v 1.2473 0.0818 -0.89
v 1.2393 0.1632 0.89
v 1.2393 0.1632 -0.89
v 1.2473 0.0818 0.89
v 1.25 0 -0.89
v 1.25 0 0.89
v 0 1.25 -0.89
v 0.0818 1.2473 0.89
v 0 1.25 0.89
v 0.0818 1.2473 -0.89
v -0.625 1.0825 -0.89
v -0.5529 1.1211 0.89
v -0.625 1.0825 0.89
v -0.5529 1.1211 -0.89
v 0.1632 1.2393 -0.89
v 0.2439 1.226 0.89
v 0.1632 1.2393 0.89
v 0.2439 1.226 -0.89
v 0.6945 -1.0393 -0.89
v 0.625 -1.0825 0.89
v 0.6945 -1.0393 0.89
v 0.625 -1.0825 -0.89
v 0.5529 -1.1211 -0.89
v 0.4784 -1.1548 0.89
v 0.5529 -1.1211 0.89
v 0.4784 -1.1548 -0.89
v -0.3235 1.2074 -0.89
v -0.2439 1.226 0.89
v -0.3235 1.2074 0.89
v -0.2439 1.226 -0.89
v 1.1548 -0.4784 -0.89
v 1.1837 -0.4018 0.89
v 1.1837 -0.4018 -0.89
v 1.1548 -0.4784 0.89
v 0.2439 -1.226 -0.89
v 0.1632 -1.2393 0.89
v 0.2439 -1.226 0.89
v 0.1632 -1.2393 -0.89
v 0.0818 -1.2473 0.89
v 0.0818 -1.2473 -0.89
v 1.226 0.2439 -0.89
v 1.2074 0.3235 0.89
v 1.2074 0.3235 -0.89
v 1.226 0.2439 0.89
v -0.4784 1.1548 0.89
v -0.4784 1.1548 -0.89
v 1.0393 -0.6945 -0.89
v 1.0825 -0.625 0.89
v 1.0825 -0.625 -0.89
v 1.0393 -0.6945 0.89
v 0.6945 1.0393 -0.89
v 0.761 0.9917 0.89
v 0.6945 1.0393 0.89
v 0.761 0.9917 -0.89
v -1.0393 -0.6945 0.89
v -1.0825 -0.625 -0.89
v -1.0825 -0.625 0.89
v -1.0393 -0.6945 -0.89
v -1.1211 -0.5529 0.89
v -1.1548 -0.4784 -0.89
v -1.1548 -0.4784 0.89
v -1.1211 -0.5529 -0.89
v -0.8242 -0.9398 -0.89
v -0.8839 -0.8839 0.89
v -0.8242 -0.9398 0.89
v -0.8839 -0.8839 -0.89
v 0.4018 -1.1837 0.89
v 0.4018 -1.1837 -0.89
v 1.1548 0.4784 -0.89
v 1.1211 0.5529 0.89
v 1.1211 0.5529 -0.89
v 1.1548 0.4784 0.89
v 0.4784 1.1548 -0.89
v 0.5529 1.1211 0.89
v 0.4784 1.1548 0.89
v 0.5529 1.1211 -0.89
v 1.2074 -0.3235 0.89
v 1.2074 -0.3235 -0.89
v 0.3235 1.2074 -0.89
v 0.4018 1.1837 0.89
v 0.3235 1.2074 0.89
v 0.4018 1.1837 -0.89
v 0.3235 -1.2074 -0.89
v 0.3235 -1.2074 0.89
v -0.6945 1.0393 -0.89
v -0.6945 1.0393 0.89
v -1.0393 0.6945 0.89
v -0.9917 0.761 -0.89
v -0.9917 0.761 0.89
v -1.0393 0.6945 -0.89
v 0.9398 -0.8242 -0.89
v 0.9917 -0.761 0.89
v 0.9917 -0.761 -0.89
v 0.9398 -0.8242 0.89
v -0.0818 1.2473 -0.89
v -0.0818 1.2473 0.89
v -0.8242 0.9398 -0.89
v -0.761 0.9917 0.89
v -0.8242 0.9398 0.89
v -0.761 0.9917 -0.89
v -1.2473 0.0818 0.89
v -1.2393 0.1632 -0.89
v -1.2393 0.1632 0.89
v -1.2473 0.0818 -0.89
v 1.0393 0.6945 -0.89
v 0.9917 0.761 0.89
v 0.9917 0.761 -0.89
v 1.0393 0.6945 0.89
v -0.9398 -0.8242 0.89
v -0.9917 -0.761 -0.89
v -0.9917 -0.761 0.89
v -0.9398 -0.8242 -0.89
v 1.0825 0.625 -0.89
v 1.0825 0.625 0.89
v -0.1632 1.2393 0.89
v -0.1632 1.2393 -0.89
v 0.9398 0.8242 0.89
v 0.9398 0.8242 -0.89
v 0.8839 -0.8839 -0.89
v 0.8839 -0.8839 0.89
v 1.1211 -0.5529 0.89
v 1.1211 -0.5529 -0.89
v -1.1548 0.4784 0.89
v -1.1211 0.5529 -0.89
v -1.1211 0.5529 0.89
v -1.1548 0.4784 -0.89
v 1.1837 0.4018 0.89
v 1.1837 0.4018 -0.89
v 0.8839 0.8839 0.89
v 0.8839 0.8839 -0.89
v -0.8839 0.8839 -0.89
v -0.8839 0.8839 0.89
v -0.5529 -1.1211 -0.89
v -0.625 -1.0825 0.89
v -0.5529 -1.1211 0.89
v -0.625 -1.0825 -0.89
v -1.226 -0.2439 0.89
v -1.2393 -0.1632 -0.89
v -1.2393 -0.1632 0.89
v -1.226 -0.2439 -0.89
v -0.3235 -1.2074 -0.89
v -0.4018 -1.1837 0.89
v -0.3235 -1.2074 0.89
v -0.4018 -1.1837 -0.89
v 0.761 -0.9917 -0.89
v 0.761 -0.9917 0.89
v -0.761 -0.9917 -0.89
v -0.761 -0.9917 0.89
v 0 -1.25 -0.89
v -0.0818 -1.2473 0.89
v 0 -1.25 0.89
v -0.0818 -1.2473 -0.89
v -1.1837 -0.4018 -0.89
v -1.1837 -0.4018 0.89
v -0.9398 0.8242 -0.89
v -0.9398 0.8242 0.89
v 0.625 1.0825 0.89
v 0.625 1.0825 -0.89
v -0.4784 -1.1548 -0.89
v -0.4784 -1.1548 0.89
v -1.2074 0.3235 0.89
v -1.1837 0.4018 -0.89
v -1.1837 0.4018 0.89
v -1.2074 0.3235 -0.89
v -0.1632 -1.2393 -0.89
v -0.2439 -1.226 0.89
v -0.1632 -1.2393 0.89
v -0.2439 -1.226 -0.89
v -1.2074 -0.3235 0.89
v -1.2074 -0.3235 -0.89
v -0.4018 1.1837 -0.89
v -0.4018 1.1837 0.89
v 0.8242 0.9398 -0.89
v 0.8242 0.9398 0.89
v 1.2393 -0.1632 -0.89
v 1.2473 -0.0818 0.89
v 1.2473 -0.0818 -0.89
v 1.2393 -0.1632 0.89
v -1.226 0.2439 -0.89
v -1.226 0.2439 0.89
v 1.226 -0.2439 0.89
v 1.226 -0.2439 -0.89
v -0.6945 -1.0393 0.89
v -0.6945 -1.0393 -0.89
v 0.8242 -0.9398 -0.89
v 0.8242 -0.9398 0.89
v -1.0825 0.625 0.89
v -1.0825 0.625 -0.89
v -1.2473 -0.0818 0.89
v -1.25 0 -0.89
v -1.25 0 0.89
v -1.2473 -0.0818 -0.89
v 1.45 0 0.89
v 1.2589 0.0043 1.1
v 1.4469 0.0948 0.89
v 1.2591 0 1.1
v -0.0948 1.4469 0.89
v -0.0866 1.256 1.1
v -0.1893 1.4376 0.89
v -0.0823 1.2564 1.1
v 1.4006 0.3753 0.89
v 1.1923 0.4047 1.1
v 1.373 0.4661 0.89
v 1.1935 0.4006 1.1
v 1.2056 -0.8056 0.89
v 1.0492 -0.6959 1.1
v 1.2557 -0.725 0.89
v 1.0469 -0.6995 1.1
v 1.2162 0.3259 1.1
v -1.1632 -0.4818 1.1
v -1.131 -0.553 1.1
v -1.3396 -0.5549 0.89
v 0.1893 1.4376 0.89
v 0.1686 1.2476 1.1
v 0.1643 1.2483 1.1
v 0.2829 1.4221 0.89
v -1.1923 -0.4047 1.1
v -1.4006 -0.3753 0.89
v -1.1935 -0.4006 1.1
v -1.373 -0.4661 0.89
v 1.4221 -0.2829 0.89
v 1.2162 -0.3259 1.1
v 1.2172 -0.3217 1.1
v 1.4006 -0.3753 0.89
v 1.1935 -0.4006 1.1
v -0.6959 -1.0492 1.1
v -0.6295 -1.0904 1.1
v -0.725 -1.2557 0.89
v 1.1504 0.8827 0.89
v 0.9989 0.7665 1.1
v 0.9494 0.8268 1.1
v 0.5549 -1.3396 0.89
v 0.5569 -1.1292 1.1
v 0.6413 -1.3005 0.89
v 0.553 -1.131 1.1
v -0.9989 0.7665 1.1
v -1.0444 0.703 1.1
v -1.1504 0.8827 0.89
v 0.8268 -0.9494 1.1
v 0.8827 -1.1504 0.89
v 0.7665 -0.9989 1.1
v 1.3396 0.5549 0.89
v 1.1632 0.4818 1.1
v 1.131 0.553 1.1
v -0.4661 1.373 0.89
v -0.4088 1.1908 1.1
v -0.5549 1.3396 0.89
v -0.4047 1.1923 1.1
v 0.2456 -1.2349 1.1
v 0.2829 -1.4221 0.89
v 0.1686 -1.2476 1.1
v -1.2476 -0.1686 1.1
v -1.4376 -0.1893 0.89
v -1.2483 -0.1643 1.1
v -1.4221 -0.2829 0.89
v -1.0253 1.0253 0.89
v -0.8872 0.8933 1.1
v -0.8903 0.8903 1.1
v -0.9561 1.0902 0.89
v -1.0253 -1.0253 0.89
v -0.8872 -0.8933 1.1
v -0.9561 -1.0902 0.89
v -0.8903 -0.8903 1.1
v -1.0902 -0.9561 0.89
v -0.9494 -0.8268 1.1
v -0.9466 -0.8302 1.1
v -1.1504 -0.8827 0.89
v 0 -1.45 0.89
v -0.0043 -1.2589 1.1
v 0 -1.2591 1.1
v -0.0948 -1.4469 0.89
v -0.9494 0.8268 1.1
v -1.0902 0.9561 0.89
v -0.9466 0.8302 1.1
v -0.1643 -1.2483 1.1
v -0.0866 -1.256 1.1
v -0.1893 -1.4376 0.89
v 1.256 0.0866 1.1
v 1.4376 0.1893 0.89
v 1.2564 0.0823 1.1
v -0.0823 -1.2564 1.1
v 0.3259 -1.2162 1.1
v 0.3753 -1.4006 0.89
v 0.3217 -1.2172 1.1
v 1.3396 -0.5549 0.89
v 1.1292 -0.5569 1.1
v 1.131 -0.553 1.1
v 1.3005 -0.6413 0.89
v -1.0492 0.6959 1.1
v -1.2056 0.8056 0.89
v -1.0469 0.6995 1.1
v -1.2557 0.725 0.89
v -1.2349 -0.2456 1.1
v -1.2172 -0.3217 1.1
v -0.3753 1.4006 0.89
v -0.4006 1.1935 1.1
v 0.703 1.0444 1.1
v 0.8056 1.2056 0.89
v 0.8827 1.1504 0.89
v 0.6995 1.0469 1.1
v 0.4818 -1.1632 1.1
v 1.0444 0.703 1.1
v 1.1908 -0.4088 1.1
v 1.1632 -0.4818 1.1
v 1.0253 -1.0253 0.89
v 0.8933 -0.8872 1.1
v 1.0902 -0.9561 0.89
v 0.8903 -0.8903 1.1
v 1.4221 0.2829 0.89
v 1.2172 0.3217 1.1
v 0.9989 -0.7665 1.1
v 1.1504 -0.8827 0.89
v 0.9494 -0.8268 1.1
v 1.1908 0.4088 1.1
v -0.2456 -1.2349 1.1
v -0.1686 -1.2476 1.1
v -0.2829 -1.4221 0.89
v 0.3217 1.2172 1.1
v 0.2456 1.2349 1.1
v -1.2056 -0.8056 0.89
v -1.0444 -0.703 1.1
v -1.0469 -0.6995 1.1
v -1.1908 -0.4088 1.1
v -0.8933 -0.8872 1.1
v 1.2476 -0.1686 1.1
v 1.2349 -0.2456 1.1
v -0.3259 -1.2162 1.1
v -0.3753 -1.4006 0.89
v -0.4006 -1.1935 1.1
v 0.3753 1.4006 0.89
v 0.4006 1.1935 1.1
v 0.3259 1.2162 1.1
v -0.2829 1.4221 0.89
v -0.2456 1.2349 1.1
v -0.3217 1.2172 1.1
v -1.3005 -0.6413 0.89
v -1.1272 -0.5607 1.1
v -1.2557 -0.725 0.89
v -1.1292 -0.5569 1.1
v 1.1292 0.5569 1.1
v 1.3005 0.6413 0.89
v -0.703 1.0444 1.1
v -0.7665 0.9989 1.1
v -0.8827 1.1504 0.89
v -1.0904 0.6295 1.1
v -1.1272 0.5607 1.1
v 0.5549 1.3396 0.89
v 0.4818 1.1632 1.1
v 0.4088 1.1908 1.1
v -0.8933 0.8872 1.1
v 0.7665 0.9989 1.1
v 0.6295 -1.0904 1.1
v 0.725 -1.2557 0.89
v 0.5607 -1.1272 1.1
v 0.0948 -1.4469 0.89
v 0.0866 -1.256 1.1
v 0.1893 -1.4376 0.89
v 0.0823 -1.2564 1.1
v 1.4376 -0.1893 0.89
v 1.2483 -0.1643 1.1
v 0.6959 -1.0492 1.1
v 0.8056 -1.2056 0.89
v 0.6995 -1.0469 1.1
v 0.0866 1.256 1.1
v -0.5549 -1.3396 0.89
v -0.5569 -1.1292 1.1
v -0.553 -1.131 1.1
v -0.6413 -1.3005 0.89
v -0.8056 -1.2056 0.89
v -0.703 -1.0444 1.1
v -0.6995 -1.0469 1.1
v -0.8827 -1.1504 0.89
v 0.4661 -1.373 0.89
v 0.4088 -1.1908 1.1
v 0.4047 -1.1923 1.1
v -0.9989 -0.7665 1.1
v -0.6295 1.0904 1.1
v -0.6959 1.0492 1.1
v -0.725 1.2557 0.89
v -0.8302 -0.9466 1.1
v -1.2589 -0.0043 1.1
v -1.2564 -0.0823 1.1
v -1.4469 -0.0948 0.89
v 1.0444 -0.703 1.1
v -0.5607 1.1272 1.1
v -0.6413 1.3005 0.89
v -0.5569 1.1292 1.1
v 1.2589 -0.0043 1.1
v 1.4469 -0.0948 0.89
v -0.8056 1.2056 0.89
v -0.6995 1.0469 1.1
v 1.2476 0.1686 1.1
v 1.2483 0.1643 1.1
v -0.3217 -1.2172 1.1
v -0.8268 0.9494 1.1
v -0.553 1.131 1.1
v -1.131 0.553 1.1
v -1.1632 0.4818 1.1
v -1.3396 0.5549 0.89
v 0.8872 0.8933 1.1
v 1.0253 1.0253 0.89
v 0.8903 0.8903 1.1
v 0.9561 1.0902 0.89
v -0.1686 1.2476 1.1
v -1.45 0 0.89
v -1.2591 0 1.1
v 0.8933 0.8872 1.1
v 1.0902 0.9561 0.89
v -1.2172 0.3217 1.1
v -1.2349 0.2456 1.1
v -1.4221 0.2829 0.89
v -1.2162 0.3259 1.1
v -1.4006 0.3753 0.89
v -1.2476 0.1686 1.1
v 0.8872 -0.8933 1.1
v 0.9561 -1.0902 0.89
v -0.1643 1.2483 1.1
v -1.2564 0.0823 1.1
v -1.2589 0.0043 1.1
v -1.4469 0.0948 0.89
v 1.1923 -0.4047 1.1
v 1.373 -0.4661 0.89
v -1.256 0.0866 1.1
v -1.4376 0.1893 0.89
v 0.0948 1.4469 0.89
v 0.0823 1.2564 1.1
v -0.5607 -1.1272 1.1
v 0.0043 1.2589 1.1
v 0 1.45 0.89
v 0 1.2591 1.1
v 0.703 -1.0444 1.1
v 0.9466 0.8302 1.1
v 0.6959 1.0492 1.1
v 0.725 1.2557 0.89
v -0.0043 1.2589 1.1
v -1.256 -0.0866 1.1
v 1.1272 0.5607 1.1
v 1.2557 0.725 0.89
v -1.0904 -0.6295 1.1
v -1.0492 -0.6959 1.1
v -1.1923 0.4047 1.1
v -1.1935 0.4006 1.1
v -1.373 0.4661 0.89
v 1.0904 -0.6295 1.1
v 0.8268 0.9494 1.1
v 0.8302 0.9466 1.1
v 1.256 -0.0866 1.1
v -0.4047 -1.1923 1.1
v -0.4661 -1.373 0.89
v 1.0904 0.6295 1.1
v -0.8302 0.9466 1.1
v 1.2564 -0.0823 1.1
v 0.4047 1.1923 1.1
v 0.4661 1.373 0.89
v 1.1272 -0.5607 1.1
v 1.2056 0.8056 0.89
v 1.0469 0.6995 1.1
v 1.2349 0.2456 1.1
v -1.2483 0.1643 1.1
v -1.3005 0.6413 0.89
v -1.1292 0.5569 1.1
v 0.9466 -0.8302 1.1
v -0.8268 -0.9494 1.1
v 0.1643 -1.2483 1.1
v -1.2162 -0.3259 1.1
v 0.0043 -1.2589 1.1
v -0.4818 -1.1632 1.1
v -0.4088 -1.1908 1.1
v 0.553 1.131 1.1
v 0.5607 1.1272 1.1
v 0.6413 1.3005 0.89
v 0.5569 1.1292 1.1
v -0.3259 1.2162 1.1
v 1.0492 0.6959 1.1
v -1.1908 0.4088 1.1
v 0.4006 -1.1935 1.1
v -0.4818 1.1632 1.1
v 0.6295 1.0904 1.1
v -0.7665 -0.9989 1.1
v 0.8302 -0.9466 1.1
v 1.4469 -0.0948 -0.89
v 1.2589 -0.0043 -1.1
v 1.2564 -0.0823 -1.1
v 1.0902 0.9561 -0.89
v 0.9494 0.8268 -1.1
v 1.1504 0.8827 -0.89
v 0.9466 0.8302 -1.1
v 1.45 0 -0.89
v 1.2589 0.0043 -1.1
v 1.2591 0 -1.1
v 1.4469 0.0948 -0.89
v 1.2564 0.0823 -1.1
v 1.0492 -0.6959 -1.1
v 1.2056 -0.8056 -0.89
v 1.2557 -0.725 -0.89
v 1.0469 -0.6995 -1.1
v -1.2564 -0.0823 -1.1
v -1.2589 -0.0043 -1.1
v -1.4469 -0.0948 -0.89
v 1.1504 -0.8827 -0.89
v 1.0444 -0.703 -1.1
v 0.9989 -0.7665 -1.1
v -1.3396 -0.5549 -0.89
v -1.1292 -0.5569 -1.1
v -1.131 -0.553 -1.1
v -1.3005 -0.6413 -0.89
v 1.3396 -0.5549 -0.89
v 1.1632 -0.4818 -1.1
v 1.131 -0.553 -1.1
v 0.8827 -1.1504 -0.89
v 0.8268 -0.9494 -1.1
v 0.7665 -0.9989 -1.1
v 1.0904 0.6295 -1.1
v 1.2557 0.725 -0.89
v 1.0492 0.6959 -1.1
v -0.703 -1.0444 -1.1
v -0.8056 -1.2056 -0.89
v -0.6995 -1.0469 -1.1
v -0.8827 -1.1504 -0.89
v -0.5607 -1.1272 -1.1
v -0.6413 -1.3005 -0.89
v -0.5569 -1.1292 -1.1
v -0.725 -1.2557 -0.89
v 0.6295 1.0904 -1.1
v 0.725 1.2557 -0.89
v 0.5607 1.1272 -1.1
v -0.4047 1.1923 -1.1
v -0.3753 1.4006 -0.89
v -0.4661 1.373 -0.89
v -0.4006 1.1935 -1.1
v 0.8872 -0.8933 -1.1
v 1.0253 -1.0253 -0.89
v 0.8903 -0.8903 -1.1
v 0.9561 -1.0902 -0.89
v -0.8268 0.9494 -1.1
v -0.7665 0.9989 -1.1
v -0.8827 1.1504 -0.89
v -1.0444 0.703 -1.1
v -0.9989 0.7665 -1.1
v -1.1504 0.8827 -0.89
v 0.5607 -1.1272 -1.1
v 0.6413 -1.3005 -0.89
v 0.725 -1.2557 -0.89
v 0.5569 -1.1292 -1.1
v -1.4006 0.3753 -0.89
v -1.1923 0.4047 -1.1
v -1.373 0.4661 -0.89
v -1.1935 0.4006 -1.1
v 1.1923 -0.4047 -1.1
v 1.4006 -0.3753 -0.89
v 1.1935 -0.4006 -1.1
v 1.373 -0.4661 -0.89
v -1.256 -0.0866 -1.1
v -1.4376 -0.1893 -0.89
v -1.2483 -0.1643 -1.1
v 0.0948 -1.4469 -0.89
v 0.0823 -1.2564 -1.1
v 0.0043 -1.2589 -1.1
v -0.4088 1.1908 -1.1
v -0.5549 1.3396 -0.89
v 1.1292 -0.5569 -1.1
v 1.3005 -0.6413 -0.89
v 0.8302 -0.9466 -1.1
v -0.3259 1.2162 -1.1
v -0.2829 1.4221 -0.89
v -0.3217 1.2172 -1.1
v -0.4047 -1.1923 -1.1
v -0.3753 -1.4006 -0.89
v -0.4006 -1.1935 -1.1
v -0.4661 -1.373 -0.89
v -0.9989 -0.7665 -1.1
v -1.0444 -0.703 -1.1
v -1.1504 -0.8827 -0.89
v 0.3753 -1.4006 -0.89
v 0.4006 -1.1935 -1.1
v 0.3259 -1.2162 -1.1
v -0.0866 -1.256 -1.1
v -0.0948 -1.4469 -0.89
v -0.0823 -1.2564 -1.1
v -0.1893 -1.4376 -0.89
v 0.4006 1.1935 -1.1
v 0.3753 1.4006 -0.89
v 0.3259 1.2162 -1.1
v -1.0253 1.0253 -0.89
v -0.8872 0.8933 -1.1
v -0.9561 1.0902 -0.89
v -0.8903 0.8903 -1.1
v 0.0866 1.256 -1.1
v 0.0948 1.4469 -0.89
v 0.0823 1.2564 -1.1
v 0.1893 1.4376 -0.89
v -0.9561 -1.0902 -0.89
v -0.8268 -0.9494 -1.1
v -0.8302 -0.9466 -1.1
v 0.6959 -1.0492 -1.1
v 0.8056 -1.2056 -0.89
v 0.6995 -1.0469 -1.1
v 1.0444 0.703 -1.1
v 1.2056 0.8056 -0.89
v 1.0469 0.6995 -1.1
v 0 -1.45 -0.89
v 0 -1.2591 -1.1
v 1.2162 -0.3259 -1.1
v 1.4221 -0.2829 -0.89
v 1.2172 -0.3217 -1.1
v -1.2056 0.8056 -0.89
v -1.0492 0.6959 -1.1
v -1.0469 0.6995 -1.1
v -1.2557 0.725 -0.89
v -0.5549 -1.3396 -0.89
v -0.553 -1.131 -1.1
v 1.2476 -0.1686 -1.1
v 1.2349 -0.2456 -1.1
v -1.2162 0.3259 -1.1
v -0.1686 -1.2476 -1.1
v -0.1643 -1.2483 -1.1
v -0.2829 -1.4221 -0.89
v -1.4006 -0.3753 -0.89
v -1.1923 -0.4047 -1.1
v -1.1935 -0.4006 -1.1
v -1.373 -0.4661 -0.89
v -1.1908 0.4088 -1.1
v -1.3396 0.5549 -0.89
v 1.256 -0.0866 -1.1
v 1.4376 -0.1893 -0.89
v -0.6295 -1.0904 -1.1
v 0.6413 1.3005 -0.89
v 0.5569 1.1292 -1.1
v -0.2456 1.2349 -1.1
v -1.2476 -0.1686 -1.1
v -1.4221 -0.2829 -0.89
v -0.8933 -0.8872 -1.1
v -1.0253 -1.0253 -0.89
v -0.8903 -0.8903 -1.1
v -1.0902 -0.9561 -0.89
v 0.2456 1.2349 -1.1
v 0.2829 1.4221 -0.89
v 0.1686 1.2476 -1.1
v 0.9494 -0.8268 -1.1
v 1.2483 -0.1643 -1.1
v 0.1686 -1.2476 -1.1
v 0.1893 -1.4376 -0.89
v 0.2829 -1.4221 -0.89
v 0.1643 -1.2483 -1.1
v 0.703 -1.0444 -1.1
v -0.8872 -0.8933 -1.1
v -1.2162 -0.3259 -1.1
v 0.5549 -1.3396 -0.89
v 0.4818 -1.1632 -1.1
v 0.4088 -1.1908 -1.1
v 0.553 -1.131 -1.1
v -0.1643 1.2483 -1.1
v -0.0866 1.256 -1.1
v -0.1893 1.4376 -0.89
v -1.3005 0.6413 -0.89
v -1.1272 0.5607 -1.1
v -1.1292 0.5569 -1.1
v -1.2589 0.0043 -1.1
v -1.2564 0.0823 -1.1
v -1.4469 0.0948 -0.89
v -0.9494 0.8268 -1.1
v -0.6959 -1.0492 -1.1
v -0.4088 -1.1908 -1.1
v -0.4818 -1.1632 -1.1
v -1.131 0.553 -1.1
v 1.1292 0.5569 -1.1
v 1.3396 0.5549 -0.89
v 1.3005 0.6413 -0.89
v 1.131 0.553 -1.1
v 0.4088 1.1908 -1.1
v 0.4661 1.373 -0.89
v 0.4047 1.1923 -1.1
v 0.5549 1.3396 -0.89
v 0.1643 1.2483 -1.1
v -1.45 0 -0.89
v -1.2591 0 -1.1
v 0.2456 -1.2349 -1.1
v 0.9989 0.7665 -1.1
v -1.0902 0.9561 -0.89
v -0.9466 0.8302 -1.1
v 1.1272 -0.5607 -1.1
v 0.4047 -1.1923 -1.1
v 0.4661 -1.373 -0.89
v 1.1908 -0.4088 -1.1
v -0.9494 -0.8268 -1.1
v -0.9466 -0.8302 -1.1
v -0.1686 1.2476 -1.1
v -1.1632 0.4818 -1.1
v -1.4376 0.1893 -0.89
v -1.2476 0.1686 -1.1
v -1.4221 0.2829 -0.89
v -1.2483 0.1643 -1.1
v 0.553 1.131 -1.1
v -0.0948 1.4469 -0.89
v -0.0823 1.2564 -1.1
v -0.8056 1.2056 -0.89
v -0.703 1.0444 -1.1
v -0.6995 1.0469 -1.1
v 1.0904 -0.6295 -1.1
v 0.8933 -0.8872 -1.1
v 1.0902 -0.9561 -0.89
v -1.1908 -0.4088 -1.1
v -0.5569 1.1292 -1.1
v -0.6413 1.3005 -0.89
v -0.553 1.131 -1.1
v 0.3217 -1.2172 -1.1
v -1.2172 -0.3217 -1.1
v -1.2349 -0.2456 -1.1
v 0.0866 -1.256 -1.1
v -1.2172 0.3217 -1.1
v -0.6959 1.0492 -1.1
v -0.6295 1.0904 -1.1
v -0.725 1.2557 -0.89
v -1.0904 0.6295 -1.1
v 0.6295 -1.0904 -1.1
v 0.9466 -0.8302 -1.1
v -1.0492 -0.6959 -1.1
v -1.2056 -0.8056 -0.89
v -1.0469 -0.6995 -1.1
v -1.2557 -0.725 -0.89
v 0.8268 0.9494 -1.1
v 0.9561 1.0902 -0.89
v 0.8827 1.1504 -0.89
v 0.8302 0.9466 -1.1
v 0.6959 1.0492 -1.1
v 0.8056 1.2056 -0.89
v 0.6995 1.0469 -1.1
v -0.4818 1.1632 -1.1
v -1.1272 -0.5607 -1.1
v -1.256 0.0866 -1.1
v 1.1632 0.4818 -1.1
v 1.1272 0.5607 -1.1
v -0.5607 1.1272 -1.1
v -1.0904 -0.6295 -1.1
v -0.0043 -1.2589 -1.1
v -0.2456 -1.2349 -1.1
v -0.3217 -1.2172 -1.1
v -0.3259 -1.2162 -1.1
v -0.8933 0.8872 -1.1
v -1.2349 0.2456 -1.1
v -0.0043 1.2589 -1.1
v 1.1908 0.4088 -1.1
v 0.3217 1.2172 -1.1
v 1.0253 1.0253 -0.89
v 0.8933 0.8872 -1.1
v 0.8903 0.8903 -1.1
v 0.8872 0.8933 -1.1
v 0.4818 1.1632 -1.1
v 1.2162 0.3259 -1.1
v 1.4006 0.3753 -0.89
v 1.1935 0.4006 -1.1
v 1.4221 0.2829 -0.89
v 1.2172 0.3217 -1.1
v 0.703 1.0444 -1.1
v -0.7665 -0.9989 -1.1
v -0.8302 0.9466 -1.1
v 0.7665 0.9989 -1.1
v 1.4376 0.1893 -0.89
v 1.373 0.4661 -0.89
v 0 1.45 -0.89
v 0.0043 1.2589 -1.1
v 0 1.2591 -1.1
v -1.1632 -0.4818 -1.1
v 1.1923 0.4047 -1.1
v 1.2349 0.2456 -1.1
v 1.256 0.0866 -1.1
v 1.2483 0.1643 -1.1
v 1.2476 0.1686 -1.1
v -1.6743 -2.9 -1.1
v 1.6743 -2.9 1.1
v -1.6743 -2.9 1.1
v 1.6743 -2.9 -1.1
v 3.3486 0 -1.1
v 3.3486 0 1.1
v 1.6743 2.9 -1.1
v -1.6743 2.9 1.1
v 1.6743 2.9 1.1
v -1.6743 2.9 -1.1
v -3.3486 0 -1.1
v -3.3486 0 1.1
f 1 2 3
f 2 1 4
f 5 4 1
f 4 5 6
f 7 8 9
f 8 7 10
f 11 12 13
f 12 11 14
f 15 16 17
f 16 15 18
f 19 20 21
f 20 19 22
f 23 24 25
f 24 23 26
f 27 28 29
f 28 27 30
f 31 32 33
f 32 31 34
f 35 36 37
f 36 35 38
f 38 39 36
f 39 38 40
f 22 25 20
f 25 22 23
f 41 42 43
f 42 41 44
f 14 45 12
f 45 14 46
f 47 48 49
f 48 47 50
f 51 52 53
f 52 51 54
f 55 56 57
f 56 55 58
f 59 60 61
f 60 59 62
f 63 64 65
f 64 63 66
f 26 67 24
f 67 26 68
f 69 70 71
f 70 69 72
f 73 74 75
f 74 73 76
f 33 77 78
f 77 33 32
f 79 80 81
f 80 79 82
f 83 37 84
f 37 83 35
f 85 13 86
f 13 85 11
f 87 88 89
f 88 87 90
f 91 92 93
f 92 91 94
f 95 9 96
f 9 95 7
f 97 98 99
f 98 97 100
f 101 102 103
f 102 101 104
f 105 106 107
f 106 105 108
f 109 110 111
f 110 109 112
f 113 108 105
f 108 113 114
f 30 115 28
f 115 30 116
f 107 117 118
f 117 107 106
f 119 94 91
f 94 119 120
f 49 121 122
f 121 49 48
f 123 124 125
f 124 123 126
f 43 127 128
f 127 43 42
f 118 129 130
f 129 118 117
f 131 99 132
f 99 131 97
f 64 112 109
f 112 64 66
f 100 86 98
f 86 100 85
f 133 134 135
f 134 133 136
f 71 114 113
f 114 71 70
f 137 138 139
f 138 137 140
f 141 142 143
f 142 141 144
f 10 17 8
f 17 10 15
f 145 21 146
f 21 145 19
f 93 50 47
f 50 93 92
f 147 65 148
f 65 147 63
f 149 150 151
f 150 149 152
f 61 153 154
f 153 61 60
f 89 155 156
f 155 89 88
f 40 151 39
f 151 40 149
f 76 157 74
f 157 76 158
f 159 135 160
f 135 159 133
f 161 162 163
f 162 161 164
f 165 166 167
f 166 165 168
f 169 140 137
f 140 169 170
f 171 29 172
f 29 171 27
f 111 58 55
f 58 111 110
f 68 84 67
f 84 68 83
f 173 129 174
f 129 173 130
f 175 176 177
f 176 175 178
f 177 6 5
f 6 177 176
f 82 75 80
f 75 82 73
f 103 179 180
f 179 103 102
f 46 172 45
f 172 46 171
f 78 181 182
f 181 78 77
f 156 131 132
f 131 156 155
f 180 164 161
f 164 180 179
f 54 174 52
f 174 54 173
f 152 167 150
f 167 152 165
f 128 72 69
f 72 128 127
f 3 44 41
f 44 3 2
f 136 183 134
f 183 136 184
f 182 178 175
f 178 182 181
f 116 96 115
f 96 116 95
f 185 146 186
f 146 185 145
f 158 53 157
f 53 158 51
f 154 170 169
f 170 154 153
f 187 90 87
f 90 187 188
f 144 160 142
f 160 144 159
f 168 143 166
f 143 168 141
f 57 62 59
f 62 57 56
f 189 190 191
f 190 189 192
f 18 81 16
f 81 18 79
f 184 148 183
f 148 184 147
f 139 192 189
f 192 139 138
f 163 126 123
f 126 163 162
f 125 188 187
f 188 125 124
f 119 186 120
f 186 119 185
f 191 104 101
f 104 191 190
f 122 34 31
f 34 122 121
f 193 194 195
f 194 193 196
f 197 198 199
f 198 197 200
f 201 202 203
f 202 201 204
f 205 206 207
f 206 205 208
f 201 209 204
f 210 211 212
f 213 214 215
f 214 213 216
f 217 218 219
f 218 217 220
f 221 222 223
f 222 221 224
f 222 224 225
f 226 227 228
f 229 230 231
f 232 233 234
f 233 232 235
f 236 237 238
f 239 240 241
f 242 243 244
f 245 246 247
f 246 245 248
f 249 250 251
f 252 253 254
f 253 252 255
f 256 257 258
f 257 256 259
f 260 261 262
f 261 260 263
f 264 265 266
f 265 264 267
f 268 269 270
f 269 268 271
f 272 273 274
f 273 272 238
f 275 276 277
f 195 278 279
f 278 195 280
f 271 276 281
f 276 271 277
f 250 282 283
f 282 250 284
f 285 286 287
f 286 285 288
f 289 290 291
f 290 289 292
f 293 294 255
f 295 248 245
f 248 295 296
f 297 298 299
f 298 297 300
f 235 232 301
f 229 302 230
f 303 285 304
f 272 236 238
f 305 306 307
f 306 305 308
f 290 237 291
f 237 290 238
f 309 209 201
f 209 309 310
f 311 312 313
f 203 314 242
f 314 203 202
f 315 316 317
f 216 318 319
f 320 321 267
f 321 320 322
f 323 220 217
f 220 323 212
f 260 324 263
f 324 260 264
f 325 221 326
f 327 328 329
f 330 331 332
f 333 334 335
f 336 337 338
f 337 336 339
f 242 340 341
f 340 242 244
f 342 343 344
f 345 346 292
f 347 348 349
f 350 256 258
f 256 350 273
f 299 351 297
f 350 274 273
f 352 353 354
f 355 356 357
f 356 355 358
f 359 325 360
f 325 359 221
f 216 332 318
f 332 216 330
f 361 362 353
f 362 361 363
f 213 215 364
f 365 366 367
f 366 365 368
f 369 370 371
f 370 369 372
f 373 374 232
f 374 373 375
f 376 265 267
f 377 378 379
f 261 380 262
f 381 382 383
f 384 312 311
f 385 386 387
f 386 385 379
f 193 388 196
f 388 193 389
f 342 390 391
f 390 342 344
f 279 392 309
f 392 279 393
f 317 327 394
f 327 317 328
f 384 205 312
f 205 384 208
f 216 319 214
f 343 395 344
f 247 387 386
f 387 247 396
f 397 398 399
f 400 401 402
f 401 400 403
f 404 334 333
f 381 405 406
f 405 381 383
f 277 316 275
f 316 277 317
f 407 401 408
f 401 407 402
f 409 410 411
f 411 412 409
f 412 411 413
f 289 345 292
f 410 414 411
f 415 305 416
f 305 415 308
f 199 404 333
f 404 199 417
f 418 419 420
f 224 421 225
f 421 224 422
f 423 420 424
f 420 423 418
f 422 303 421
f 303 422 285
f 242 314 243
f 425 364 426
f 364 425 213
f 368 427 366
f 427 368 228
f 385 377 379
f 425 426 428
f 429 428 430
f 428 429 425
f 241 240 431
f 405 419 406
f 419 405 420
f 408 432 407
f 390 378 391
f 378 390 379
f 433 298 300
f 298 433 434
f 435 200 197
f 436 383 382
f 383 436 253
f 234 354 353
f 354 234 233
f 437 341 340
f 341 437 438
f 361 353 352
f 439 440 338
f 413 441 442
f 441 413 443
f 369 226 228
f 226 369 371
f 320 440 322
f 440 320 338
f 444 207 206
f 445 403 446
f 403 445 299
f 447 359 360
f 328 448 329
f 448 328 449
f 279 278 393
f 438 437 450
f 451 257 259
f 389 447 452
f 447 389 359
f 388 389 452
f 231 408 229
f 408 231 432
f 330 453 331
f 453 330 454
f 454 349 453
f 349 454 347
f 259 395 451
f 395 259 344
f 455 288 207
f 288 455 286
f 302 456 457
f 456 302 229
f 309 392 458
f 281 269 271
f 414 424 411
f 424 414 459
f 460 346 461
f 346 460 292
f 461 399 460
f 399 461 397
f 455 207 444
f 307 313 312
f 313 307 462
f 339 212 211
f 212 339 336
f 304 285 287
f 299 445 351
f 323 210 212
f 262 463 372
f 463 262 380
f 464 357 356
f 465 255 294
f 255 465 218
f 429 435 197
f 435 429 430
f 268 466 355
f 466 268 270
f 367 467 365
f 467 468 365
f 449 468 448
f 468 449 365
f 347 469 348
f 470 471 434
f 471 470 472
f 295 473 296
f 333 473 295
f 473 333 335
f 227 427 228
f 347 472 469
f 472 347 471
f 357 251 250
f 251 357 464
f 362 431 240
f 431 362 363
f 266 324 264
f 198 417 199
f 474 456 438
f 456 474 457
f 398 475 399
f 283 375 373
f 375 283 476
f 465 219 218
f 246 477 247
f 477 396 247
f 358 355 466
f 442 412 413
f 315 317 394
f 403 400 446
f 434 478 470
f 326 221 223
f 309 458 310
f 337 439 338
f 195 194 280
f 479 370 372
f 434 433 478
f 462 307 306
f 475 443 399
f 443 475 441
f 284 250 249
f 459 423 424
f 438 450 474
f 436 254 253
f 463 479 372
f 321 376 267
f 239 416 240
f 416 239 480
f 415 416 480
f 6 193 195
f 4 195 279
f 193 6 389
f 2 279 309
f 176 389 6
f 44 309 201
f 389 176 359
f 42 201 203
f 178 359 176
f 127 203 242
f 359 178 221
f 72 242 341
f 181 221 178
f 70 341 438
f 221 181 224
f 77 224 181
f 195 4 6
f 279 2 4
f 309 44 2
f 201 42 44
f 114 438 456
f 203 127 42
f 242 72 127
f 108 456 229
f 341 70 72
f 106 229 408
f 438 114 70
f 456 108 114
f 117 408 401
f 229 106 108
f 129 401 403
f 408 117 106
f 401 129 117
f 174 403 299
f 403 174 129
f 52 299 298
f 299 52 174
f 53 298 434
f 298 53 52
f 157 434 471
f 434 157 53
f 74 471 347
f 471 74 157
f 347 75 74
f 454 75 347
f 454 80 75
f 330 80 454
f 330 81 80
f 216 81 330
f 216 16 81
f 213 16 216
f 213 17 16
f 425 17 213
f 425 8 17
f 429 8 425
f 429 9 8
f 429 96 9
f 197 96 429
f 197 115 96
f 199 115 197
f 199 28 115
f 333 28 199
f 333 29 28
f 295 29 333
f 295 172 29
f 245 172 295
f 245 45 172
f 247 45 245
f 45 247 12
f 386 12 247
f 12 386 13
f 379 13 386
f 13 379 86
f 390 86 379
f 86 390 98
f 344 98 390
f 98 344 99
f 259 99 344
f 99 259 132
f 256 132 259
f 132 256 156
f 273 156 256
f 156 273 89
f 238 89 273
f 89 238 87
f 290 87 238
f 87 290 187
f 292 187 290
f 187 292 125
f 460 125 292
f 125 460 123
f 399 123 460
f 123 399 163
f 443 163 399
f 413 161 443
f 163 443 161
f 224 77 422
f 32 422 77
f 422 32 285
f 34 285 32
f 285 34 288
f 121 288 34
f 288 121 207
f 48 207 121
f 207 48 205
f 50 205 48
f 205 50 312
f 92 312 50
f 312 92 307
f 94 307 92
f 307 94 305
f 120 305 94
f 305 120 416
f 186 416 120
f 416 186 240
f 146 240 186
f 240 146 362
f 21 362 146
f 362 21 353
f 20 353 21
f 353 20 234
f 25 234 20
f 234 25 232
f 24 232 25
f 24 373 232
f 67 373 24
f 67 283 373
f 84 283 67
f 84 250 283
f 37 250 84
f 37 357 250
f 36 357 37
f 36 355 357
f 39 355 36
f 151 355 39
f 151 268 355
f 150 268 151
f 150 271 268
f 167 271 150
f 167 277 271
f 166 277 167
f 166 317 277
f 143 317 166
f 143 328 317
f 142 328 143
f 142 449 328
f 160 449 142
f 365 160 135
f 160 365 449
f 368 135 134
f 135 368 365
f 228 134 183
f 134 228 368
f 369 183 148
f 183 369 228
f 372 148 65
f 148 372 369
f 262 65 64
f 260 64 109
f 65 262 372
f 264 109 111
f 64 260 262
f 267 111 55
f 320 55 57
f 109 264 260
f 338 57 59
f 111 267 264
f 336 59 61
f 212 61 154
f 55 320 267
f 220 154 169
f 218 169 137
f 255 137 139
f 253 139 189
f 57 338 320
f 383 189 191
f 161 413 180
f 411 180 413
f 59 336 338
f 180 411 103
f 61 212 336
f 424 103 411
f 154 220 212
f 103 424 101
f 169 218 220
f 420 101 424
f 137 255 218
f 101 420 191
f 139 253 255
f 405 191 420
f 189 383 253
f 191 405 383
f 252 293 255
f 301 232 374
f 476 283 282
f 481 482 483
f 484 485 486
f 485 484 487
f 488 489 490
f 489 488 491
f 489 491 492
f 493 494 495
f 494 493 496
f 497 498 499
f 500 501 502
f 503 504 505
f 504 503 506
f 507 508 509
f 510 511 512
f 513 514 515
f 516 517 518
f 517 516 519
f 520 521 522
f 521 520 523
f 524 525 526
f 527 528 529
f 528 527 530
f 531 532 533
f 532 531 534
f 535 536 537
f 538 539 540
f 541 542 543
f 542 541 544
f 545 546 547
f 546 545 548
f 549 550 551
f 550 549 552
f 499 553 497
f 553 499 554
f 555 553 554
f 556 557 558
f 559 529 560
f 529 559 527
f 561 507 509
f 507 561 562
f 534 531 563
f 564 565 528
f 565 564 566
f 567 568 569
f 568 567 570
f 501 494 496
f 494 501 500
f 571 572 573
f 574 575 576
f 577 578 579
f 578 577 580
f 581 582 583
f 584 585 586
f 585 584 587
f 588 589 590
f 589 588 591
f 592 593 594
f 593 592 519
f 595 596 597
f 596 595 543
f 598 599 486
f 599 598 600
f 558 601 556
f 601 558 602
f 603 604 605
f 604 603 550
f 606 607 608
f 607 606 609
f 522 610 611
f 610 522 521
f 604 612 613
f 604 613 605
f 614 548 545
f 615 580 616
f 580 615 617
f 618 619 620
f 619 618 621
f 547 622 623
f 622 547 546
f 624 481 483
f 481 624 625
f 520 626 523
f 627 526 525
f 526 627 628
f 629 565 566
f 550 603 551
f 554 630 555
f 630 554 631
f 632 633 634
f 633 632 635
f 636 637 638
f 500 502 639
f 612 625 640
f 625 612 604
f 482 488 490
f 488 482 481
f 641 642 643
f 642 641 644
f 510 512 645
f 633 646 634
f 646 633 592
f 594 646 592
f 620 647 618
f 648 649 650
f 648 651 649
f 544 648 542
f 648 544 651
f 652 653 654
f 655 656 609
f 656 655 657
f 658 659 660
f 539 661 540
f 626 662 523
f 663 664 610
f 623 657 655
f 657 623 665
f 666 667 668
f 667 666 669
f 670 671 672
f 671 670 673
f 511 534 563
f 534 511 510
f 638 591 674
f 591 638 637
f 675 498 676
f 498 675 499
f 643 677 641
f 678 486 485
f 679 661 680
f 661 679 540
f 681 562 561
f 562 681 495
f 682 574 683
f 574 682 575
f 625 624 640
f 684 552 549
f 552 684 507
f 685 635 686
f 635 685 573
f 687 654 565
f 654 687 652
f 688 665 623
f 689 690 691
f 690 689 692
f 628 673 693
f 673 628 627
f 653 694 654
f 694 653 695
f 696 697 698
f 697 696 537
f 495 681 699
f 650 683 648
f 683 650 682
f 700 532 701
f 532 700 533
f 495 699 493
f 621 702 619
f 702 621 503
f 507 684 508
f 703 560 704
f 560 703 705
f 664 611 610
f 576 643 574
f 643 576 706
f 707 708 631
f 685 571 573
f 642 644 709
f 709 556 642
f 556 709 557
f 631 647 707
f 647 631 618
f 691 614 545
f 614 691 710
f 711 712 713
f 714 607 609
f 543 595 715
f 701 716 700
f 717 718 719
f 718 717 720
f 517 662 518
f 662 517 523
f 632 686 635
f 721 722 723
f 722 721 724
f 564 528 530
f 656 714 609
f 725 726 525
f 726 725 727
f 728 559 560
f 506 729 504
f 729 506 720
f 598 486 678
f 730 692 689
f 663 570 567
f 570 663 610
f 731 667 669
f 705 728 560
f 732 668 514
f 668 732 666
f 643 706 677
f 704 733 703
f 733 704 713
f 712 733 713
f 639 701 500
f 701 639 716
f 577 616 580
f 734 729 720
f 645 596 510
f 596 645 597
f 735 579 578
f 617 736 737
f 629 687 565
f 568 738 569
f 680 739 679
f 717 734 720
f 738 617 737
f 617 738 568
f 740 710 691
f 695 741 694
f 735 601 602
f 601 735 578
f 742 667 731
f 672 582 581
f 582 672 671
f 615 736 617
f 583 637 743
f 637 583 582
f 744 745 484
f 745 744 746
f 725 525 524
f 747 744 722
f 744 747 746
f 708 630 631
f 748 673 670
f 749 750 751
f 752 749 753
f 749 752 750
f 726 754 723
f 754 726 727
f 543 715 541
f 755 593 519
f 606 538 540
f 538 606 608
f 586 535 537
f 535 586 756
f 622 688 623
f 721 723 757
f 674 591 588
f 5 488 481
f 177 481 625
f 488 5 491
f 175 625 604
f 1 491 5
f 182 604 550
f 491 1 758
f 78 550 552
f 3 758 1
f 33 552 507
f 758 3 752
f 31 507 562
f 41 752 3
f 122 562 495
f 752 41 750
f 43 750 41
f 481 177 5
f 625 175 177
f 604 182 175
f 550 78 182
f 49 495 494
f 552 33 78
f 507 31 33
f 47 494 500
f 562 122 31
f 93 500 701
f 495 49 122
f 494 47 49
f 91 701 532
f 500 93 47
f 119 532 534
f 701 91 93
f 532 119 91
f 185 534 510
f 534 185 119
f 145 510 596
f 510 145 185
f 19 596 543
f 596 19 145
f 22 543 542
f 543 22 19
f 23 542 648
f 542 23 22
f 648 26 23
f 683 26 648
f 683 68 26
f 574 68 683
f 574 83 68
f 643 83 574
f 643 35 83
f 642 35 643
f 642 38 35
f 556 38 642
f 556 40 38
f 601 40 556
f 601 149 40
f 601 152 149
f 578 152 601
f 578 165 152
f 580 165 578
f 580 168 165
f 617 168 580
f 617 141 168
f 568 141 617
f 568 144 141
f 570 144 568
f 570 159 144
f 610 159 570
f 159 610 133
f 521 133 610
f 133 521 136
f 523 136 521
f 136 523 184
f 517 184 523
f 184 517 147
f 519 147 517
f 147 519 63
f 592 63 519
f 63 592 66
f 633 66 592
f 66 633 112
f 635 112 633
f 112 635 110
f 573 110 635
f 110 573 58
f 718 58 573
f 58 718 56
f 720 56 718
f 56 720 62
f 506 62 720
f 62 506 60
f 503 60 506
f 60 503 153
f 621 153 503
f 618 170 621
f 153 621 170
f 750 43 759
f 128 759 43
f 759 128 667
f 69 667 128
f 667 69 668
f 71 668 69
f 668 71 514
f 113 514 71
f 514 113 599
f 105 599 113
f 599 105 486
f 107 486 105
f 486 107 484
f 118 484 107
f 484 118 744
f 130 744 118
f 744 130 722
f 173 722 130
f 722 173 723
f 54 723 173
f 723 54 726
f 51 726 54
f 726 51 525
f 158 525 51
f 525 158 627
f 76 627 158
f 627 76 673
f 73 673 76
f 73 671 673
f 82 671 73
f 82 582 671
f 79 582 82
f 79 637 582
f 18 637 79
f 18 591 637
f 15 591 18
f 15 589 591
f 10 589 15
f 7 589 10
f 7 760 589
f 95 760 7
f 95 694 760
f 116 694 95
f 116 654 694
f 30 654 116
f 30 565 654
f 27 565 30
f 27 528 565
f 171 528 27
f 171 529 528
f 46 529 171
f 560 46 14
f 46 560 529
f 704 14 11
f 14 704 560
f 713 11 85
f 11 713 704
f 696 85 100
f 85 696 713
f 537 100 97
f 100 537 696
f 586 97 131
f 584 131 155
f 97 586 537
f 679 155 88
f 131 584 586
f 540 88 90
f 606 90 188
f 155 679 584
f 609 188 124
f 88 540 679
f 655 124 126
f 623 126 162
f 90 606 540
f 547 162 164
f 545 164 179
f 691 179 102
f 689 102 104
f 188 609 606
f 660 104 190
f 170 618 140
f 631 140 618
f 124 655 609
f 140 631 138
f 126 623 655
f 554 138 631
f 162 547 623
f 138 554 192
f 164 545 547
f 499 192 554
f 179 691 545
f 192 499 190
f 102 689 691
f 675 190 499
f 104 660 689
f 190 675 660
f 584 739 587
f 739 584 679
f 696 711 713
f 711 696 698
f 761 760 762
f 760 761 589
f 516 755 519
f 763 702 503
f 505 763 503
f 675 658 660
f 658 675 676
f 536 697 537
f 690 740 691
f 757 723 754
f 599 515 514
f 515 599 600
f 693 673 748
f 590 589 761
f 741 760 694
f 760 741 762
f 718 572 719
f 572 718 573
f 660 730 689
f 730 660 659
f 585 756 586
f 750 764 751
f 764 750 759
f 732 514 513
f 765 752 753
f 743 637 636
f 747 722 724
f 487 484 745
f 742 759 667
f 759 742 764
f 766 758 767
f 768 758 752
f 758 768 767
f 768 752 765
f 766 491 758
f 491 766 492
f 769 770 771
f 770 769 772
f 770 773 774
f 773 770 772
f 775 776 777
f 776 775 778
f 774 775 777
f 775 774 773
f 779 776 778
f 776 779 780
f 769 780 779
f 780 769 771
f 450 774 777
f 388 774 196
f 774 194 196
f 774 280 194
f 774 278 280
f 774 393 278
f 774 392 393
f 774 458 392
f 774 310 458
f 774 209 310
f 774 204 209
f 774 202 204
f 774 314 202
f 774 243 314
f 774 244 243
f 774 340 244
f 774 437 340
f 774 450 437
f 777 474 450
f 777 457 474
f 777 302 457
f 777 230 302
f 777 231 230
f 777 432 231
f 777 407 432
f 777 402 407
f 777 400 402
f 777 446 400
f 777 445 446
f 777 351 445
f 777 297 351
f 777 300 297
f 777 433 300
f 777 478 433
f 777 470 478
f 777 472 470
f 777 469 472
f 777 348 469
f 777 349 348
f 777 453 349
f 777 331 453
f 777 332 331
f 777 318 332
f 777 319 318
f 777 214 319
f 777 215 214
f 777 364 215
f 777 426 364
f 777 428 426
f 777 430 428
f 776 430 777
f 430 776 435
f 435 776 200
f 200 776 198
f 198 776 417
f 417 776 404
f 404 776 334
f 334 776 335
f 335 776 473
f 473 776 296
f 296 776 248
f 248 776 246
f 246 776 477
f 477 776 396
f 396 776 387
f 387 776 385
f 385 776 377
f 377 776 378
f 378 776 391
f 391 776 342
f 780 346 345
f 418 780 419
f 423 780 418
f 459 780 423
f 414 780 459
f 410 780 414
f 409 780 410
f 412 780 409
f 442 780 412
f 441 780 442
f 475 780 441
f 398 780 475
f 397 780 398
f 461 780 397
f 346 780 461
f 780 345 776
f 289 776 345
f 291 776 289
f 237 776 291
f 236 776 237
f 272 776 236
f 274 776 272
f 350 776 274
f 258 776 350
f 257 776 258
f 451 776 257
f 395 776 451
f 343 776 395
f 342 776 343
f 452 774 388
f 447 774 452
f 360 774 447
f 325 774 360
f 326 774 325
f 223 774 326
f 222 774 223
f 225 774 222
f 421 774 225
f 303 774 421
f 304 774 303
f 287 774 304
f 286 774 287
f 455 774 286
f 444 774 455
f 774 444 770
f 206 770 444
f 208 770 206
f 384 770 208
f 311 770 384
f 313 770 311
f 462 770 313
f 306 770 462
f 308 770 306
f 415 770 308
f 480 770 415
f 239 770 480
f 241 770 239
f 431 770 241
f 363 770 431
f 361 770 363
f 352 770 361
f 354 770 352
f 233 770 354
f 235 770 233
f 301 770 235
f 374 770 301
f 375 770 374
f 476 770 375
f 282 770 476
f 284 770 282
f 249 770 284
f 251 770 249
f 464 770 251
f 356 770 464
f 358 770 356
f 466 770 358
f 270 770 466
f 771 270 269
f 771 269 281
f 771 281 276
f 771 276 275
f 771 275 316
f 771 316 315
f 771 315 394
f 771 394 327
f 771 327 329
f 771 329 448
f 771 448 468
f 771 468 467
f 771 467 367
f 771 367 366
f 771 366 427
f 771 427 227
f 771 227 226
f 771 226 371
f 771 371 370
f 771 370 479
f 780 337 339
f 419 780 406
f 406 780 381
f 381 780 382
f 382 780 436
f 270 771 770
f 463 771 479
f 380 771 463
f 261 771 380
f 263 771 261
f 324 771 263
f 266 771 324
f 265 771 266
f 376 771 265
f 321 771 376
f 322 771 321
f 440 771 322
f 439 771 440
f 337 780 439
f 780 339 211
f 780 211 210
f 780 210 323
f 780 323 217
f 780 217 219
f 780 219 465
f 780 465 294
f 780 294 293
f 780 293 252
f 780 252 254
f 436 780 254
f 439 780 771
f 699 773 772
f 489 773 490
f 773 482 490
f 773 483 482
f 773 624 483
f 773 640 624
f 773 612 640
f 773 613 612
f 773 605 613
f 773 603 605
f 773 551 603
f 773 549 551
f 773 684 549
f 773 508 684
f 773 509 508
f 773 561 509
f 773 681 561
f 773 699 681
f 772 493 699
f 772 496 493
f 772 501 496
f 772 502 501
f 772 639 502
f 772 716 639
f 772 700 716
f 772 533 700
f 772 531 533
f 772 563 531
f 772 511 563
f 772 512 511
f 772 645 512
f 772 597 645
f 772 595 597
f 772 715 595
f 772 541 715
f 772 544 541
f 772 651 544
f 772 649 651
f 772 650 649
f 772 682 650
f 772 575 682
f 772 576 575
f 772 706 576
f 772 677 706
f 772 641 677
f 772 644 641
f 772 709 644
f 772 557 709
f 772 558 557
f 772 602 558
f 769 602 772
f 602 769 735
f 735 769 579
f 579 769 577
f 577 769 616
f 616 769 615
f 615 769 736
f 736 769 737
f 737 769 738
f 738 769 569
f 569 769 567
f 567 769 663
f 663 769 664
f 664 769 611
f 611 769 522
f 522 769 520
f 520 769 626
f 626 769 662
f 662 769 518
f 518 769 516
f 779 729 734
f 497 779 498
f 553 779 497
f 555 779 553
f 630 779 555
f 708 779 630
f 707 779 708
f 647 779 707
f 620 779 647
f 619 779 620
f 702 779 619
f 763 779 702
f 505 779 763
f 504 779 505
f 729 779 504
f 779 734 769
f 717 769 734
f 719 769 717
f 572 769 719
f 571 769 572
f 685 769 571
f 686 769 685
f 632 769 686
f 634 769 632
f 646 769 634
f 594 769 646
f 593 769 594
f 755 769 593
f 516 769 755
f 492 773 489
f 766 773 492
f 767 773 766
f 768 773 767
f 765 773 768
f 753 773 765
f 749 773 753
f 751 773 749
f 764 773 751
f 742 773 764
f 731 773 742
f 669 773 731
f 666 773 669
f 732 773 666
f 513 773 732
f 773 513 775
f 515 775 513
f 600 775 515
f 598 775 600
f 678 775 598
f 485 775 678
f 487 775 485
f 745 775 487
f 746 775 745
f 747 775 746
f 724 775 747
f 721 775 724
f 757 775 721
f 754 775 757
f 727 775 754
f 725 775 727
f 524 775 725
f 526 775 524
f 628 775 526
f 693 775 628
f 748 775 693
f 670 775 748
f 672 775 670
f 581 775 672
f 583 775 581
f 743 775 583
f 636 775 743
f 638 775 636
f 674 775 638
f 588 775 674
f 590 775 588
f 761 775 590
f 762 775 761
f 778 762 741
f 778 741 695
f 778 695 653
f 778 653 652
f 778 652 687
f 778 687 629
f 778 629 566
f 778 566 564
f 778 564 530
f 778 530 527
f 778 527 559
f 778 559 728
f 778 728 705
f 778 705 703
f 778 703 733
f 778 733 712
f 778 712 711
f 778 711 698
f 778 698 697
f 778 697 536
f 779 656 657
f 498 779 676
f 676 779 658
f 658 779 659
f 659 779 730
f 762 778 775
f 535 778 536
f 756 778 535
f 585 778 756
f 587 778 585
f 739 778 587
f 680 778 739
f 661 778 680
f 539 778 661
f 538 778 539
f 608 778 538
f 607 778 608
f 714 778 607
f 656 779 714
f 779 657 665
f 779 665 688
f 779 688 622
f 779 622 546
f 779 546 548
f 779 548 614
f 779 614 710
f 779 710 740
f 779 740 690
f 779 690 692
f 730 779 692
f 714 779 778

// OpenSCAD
// Hex nut for M2.5
thread_diameter = 2.5;      // mm (nominal)
across_flats    = 5.8;      // mm
thickness       = 2.2;      // mm
lead_in_chamfer = 0.2;      // mm
eps             = 0.02;     // mm (small to avoid artifacts)

$fn = 96;

// Single solid: hex body with circular bore + small lead-in chamfers
module hex_nut_M25() {
    difference() {
        // Hexagonal body (across flats = 2 * apothem)
        cylinder(
            h = thickness,
            r = across_flats / (2 * cos(30)),
            $fn = 6,
            center = true
        );

        // Circular bore (clearance for M2.5; adjust if you want tighter/looser)
        union() {
            cylinder(h = thickness + 2*eps, r = thread_diameter/2, center = true);

            // Top lead-in chamfer
            translate([0, 0, thickness/2 - (lead_in_chamfer/2)])
                cylinder(
                    h  = lead_in_chamfer + eps,
                    r1 = thread_diameter/2 + lead_in_chamfer,
                    r2 = thread_diameter/2,
                    center = true
                );

            // Bottom lead-in chamfer
            translate([0, 0, -thickness/2 + (lead_in_chamfer/2)])
                cylinder(
                    h  = lead_in_chamfer + eps,
                    r1 = thread_diameter/2,
                    r2 = thread_diameter/2 + lead_in_chamfer,
                    center = true
                );
        }
    }
}

hex_nut_M25();
